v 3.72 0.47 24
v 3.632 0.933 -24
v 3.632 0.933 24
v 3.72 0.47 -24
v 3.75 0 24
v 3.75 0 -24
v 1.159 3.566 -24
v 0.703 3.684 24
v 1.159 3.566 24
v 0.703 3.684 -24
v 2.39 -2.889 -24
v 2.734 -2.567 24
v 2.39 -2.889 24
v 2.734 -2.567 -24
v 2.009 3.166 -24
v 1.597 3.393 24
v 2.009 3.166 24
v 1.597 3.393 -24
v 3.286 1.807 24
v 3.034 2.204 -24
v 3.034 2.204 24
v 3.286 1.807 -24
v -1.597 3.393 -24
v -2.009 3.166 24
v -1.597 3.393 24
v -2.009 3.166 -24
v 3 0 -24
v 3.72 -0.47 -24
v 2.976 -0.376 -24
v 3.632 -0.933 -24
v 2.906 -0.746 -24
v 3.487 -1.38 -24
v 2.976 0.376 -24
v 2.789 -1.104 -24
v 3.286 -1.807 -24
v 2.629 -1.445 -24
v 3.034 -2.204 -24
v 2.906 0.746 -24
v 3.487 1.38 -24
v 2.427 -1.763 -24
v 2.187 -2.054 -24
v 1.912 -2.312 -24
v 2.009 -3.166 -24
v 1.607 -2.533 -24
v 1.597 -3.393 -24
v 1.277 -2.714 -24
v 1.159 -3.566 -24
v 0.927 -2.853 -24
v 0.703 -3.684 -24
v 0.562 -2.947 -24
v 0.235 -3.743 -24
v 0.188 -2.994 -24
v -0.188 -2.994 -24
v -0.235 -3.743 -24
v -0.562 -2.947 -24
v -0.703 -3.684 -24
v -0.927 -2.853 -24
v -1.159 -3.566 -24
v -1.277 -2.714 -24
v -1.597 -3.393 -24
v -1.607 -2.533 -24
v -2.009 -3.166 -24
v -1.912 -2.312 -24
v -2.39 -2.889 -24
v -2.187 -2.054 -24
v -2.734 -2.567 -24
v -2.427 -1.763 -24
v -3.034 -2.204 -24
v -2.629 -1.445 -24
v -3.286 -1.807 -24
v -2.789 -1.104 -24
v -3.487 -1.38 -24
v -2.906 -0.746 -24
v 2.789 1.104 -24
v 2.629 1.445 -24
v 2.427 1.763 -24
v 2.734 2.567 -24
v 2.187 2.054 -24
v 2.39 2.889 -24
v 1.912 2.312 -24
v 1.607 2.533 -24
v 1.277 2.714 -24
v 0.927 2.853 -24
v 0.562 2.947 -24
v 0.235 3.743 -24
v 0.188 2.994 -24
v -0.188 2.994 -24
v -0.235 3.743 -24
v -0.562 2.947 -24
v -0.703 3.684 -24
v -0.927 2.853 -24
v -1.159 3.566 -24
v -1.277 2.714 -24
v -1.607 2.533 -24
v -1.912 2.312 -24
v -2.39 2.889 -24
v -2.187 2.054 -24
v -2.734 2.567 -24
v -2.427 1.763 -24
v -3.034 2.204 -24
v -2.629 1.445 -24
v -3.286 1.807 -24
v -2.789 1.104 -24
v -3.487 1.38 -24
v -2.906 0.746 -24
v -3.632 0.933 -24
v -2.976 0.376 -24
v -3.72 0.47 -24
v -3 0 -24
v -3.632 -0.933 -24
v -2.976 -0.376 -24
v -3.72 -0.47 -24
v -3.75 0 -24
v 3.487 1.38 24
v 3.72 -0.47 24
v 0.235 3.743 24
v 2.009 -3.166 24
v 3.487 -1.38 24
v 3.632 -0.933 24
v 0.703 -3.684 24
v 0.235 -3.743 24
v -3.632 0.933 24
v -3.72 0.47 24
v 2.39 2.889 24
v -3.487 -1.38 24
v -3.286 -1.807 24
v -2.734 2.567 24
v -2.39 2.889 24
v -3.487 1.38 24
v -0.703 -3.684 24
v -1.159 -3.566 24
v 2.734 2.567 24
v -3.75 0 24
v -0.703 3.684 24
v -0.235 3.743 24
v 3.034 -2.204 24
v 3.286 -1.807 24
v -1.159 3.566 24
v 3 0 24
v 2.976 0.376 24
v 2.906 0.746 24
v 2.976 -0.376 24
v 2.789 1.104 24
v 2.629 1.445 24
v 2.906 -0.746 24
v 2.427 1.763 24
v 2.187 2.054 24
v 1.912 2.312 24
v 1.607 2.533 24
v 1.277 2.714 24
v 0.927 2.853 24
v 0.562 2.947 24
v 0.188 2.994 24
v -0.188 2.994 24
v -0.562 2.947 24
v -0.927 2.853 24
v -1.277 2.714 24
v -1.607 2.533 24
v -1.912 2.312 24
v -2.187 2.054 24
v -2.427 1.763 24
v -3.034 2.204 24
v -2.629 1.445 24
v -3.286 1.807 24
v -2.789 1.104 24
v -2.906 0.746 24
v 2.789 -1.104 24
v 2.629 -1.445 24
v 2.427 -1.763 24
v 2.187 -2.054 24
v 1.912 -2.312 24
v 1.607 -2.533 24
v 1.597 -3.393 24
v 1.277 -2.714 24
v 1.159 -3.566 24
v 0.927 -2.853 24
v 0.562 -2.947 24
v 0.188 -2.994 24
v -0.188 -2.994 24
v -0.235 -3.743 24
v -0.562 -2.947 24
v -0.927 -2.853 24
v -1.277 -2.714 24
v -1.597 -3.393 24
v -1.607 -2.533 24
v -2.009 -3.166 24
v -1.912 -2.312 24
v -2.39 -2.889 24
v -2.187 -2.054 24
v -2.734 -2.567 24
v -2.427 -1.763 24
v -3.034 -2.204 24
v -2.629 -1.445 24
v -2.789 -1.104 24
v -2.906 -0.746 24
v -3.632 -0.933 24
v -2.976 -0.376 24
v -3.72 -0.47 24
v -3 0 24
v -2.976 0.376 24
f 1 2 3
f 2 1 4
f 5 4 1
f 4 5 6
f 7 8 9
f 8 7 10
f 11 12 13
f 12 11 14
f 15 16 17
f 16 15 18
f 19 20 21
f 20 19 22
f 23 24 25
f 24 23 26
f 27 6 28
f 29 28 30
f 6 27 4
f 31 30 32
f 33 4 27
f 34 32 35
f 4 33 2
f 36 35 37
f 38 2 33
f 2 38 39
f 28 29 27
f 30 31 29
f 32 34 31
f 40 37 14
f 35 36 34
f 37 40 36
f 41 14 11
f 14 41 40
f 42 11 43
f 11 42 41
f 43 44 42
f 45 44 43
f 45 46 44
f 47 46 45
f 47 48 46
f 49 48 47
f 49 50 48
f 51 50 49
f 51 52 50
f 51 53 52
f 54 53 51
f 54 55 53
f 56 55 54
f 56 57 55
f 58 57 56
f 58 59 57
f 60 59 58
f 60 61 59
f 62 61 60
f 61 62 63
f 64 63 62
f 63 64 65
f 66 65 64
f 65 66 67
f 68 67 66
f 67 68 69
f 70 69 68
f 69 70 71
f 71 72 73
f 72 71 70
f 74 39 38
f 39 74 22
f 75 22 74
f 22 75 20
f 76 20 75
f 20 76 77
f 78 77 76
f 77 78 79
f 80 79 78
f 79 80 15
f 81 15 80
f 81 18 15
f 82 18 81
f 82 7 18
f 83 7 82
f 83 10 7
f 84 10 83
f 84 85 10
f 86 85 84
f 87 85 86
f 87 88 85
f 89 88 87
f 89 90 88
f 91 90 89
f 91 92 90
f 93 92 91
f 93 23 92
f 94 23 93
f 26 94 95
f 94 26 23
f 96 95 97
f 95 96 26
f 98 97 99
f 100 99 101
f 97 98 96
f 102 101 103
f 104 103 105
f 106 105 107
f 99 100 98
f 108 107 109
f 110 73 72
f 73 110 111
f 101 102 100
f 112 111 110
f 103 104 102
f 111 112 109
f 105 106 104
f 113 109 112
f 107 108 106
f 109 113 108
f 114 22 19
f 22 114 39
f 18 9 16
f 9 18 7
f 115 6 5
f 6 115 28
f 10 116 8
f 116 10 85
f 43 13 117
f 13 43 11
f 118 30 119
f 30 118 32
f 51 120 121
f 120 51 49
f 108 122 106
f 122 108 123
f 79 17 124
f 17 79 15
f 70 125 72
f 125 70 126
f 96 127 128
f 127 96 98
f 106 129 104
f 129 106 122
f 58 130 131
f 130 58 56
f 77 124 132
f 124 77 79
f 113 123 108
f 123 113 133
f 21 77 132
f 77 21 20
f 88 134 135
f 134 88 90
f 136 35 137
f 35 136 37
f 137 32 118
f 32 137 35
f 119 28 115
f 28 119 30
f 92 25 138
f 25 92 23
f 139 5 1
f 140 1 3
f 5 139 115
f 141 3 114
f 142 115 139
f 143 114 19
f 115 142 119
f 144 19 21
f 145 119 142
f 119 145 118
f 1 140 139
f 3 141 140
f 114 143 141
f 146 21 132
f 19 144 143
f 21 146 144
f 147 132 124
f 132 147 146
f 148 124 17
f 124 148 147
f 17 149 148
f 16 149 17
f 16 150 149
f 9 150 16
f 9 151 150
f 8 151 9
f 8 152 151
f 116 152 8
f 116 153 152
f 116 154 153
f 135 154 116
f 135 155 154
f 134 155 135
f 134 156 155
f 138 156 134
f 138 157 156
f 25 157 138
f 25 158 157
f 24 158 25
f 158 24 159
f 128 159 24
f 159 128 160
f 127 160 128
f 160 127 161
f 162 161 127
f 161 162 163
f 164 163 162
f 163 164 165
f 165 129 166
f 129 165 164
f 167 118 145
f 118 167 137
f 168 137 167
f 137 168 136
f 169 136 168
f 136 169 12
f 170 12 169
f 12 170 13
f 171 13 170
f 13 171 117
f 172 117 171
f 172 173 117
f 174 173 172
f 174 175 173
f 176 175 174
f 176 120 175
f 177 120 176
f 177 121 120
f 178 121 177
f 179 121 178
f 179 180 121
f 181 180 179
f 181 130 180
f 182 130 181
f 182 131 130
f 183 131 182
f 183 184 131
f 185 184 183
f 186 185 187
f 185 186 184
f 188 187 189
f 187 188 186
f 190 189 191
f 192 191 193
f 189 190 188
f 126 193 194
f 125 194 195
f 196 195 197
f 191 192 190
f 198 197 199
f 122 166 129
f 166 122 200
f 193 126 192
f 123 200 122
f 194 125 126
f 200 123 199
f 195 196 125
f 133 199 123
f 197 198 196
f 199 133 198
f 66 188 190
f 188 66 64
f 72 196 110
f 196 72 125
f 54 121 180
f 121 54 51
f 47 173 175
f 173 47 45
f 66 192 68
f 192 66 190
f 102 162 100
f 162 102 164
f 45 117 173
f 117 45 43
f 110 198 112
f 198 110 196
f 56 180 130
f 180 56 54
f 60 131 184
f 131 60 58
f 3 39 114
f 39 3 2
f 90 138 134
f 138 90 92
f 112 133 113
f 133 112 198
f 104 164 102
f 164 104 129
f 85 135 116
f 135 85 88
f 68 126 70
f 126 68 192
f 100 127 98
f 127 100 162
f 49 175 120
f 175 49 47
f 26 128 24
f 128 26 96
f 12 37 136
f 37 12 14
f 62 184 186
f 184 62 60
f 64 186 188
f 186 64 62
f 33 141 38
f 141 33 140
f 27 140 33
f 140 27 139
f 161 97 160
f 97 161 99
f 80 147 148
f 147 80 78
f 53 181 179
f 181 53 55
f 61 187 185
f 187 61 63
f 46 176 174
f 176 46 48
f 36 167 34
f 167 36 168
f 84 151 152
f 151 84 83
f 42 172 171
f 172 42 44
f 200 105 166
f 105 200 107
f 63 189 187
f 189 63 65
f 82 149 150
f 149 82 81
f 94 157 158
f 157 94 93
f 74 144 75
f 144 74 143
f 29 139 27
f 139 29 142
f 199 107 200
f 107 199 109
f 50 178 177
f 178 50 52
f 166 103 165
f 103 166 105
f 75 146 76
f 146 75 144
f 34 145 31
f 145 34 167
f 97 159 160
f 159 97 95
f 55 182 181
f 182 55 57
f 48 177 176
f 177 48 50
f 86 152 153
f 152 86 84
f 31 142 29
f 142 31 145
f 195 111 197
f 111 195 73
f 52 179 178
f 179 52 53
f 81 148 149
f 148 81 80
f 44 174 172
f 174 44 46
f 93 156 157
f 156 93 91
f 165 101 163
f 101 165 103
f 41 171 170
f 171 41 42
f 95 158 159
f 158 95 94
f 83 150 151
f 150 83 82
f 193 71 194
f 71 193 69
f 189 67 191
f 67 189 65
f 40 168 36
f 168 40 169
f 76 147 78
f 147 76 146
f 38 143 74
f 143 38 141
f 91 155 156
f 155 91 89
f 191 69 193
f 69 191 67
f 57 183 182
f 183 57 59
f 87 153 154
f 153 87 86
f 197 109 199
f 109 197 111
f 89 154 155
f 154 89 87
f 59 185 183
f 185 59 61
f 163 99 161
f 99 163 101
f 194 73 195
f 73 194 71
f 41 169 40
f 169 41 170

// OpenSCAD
$fn = 50;


difference() {
	union() {
		translate(v = [0, 0, -24.0000000000]) {
			cylinder(h = 48, r = 3.7500000000);
		}
	}
	union() {
		translate(v = [0, 0, -100.0000000000]) {
			cylinder(h = 200, r = 3.0000000000);
		}
	}
}
